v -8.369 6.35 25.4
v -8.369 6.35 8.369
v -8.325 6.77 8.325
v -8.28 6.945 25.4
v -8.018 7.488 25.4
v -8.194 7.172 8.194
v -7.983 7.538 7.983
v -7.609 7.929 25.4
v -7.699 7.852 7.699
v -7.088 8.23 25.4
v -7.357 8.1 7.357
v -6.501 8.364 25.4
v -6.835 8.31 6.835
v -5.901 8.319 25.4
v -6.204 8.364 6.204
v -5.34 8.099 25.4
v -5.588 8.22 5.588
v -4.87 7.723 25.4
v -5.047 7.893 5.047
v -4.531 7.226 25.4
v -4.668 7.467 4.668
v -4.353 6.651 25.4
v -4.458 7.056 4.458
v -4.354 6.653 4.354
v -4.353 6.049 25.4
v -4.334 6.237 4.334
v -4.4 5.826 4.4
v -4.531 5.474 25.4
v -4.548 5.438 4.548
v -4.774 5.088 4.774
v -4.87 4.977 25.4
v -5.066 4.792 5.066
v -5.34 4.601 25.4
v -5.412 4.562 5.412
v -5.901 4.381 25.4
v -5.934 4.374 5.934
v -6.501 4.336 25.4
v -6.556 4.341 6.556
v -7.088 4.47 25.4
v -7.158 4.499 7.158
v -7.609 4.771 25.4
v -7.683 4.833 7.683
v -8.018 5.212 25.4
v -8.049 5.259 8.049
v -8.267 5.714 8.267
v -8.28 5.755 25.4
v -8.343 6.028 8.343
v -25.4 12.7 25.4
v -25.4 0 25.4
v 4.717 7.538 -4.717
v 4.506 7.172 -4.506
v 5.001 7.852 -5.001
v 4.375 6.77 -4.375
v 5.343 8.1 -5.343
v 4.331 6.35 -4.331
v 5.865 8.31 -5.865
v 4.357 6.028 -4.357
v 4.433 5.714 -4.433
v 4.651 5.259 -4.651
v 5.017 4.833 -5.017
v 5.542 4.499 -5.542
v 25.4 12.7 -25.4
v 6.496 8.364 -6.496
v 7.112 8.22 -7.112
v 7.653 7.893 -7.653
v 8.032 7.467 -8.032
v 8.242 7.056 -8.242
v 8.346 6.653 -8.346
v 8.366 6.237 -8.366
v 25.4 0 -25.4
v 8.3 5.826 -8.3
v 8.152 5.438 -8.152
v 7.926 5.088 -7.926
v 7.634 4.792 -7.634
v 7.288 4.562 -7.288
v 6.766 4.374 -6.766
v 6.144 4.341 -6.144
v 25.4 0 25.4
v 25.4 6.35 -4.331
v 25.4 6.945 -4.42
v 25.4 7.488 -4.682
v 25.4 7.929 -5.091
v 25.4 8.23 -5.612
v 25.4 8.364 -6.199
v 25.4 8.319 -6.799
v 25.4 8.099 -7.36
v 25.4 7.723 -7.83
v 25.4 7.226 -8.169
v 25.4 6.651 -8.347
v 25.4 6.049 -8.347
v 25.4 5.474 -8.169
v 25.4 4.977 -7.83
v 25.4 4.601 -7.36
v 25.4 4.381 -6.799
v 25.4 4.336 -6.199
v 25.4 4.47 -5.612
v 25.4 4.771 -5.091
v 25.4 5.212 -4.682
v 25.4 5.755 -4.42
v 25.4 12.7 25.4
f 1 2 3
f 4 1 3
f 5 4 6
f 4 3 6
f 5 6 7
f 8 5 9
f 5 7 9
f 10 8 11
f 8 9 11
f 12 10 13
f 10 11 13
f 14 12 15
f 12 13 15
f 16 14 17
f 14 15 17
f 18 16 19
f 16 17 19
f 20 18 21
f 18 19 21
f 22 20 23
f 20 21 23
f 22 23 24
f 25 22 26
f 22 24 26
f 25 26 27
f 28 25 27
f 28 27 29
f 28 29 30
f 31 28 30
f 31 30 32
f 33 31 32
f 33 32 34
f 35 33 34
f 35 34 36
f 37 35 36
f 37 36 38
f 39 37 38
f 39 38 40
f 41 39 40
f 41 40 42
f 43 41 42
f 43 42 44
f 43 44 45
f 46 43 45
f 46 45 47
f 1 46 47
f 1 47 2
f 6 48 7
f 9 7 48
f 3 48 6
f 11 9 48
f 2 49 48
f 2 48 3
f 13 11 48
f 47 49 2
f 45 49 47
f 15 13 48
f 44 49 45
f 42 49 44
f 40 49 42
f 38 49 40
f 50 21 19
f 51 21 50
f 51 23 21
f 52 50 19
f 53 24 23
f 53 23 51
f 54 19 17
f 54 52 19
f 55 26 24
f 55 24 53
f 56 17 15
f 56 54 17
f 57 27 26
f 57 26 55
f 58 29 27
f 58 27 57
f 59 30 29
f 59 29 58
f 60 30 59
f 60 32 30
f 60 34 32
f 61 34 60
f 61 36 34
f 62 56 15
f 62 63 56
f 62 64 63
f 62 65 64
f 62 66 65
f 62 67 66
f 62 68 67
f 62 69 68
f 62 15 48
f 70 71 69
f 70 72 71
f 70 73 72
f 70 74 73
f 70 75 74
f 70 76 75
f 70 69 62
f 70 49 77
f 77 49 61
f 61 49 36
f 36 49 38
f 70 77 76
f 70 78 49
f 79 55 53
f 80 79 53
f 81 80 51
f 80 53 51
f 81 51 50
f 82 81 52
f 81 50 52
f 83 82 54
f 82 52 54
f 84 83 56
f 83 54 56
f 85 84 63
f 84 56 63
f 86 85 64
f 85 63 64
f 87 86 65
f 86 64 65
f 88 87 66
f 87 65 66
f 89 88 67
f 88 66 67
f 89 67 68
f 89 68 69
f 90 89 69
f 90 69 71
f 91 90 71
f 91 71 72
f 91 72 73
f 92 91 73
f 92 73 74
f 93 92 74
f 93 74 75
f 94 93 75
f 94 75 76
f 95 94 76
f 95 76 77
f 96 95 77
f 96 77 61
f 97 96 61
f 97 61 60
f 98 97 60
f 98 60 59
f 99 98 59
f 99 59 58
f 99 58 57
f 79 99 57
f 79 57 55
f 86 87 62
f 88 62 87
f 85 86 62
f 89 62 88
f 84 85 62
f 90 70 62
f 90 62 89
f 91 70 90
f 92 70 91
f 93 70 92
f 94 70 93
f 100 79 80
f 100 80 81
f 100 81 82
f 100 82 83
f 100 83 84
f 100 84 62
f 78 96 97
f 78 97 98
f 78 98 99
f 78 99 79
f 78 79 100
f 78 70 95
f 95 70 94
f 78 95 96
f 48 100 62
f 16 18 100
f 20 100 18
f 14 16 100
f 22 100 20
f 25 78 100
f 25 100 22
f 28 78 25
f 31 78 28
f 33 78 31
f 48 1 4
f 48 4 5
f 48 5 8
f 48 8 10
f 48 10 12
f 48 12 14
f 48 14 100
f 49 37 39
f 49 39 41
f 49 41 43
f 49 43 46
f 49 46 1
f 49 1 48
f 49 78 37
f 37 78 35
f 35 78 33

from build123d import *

# Parameters (mm, degrees)
BOSS_EXTRUDE1_DEPTH        = 12.7
F_10_32_TAPPED_HOLE1_D     = 4.0386
F_10_32_TAPPED_HOLE1_DEPTH = 25.4
F_10_32_TAPPED_HOLE1_TIP   = 1.213317848
F_10_32_TAPPED_HOLE2_D     = 4.0386
F_10_32_TAPPED_HOLE2_DEPTH = 25.4
F_10_32_TAPPED_HOLE2_TIP   = 1.213317848


with BuildPart() as part:
    # Sketch1 → Boss-Extrude1 (new body)
    with BuildSketch(Plane(origin=(0, 0, 0), x_dir=(1, 0, 0), z_dir=(0, 1, 0))):
        Polygon((-25.4, -25.4), (25.4, 25.4), (25.4, -25.4), align=None)
    extrude(amount=BOSS_EXTRUDE1_DEPTH)

    # #10-32 Tapped Hole1
    with Locations(Plane(origin=(25.4, 0, 0), x_dir=(0, 0, -1), z_dir=(1, 0, 0))):
        with Locations((6.35, 6.35)):
            Hole(F_10_32_TAPPED_HOLE1_D / 2, depth=F_10_32_TAPPED_HOLE1_DEPTH)
            with Locations((0, 0, -(F_10_32_TAPPED_HOLE1_DEPTH + F_10_32_TAPPED_HOLE1_TIP / 2))):  # 118° drill point
                Cone(0, F_10_32_TAPPED_HOLE1_D / 2, F_10_32_TAPPED_HOLE1_TIP, mode=Mode.SUBTRACT)

    # #10-32 Tapped Hole2
    with Locations(Plane.XY.offset(25.4)):
        with Locations((-6.35, 6.35)):
            Hole(F_10_32_TAPPED_HOLE2_D / 2, depth=F_10_32_TAPPED_HOLE2_DEPTH)
            with Locations((0, 0, -(F_10_32_TAPPED_HOLE2_DEPTH + F_10_32_TAPPED_HOLE2_TIP / 2))):  # 118° drill point
                Cone(0, F_10_32_TAPPED_HOLE2_D / 2, F_10_32_TAPPED_HOLE2_TIP, mode=Mode.SUBTRACT)


solid = part.part
